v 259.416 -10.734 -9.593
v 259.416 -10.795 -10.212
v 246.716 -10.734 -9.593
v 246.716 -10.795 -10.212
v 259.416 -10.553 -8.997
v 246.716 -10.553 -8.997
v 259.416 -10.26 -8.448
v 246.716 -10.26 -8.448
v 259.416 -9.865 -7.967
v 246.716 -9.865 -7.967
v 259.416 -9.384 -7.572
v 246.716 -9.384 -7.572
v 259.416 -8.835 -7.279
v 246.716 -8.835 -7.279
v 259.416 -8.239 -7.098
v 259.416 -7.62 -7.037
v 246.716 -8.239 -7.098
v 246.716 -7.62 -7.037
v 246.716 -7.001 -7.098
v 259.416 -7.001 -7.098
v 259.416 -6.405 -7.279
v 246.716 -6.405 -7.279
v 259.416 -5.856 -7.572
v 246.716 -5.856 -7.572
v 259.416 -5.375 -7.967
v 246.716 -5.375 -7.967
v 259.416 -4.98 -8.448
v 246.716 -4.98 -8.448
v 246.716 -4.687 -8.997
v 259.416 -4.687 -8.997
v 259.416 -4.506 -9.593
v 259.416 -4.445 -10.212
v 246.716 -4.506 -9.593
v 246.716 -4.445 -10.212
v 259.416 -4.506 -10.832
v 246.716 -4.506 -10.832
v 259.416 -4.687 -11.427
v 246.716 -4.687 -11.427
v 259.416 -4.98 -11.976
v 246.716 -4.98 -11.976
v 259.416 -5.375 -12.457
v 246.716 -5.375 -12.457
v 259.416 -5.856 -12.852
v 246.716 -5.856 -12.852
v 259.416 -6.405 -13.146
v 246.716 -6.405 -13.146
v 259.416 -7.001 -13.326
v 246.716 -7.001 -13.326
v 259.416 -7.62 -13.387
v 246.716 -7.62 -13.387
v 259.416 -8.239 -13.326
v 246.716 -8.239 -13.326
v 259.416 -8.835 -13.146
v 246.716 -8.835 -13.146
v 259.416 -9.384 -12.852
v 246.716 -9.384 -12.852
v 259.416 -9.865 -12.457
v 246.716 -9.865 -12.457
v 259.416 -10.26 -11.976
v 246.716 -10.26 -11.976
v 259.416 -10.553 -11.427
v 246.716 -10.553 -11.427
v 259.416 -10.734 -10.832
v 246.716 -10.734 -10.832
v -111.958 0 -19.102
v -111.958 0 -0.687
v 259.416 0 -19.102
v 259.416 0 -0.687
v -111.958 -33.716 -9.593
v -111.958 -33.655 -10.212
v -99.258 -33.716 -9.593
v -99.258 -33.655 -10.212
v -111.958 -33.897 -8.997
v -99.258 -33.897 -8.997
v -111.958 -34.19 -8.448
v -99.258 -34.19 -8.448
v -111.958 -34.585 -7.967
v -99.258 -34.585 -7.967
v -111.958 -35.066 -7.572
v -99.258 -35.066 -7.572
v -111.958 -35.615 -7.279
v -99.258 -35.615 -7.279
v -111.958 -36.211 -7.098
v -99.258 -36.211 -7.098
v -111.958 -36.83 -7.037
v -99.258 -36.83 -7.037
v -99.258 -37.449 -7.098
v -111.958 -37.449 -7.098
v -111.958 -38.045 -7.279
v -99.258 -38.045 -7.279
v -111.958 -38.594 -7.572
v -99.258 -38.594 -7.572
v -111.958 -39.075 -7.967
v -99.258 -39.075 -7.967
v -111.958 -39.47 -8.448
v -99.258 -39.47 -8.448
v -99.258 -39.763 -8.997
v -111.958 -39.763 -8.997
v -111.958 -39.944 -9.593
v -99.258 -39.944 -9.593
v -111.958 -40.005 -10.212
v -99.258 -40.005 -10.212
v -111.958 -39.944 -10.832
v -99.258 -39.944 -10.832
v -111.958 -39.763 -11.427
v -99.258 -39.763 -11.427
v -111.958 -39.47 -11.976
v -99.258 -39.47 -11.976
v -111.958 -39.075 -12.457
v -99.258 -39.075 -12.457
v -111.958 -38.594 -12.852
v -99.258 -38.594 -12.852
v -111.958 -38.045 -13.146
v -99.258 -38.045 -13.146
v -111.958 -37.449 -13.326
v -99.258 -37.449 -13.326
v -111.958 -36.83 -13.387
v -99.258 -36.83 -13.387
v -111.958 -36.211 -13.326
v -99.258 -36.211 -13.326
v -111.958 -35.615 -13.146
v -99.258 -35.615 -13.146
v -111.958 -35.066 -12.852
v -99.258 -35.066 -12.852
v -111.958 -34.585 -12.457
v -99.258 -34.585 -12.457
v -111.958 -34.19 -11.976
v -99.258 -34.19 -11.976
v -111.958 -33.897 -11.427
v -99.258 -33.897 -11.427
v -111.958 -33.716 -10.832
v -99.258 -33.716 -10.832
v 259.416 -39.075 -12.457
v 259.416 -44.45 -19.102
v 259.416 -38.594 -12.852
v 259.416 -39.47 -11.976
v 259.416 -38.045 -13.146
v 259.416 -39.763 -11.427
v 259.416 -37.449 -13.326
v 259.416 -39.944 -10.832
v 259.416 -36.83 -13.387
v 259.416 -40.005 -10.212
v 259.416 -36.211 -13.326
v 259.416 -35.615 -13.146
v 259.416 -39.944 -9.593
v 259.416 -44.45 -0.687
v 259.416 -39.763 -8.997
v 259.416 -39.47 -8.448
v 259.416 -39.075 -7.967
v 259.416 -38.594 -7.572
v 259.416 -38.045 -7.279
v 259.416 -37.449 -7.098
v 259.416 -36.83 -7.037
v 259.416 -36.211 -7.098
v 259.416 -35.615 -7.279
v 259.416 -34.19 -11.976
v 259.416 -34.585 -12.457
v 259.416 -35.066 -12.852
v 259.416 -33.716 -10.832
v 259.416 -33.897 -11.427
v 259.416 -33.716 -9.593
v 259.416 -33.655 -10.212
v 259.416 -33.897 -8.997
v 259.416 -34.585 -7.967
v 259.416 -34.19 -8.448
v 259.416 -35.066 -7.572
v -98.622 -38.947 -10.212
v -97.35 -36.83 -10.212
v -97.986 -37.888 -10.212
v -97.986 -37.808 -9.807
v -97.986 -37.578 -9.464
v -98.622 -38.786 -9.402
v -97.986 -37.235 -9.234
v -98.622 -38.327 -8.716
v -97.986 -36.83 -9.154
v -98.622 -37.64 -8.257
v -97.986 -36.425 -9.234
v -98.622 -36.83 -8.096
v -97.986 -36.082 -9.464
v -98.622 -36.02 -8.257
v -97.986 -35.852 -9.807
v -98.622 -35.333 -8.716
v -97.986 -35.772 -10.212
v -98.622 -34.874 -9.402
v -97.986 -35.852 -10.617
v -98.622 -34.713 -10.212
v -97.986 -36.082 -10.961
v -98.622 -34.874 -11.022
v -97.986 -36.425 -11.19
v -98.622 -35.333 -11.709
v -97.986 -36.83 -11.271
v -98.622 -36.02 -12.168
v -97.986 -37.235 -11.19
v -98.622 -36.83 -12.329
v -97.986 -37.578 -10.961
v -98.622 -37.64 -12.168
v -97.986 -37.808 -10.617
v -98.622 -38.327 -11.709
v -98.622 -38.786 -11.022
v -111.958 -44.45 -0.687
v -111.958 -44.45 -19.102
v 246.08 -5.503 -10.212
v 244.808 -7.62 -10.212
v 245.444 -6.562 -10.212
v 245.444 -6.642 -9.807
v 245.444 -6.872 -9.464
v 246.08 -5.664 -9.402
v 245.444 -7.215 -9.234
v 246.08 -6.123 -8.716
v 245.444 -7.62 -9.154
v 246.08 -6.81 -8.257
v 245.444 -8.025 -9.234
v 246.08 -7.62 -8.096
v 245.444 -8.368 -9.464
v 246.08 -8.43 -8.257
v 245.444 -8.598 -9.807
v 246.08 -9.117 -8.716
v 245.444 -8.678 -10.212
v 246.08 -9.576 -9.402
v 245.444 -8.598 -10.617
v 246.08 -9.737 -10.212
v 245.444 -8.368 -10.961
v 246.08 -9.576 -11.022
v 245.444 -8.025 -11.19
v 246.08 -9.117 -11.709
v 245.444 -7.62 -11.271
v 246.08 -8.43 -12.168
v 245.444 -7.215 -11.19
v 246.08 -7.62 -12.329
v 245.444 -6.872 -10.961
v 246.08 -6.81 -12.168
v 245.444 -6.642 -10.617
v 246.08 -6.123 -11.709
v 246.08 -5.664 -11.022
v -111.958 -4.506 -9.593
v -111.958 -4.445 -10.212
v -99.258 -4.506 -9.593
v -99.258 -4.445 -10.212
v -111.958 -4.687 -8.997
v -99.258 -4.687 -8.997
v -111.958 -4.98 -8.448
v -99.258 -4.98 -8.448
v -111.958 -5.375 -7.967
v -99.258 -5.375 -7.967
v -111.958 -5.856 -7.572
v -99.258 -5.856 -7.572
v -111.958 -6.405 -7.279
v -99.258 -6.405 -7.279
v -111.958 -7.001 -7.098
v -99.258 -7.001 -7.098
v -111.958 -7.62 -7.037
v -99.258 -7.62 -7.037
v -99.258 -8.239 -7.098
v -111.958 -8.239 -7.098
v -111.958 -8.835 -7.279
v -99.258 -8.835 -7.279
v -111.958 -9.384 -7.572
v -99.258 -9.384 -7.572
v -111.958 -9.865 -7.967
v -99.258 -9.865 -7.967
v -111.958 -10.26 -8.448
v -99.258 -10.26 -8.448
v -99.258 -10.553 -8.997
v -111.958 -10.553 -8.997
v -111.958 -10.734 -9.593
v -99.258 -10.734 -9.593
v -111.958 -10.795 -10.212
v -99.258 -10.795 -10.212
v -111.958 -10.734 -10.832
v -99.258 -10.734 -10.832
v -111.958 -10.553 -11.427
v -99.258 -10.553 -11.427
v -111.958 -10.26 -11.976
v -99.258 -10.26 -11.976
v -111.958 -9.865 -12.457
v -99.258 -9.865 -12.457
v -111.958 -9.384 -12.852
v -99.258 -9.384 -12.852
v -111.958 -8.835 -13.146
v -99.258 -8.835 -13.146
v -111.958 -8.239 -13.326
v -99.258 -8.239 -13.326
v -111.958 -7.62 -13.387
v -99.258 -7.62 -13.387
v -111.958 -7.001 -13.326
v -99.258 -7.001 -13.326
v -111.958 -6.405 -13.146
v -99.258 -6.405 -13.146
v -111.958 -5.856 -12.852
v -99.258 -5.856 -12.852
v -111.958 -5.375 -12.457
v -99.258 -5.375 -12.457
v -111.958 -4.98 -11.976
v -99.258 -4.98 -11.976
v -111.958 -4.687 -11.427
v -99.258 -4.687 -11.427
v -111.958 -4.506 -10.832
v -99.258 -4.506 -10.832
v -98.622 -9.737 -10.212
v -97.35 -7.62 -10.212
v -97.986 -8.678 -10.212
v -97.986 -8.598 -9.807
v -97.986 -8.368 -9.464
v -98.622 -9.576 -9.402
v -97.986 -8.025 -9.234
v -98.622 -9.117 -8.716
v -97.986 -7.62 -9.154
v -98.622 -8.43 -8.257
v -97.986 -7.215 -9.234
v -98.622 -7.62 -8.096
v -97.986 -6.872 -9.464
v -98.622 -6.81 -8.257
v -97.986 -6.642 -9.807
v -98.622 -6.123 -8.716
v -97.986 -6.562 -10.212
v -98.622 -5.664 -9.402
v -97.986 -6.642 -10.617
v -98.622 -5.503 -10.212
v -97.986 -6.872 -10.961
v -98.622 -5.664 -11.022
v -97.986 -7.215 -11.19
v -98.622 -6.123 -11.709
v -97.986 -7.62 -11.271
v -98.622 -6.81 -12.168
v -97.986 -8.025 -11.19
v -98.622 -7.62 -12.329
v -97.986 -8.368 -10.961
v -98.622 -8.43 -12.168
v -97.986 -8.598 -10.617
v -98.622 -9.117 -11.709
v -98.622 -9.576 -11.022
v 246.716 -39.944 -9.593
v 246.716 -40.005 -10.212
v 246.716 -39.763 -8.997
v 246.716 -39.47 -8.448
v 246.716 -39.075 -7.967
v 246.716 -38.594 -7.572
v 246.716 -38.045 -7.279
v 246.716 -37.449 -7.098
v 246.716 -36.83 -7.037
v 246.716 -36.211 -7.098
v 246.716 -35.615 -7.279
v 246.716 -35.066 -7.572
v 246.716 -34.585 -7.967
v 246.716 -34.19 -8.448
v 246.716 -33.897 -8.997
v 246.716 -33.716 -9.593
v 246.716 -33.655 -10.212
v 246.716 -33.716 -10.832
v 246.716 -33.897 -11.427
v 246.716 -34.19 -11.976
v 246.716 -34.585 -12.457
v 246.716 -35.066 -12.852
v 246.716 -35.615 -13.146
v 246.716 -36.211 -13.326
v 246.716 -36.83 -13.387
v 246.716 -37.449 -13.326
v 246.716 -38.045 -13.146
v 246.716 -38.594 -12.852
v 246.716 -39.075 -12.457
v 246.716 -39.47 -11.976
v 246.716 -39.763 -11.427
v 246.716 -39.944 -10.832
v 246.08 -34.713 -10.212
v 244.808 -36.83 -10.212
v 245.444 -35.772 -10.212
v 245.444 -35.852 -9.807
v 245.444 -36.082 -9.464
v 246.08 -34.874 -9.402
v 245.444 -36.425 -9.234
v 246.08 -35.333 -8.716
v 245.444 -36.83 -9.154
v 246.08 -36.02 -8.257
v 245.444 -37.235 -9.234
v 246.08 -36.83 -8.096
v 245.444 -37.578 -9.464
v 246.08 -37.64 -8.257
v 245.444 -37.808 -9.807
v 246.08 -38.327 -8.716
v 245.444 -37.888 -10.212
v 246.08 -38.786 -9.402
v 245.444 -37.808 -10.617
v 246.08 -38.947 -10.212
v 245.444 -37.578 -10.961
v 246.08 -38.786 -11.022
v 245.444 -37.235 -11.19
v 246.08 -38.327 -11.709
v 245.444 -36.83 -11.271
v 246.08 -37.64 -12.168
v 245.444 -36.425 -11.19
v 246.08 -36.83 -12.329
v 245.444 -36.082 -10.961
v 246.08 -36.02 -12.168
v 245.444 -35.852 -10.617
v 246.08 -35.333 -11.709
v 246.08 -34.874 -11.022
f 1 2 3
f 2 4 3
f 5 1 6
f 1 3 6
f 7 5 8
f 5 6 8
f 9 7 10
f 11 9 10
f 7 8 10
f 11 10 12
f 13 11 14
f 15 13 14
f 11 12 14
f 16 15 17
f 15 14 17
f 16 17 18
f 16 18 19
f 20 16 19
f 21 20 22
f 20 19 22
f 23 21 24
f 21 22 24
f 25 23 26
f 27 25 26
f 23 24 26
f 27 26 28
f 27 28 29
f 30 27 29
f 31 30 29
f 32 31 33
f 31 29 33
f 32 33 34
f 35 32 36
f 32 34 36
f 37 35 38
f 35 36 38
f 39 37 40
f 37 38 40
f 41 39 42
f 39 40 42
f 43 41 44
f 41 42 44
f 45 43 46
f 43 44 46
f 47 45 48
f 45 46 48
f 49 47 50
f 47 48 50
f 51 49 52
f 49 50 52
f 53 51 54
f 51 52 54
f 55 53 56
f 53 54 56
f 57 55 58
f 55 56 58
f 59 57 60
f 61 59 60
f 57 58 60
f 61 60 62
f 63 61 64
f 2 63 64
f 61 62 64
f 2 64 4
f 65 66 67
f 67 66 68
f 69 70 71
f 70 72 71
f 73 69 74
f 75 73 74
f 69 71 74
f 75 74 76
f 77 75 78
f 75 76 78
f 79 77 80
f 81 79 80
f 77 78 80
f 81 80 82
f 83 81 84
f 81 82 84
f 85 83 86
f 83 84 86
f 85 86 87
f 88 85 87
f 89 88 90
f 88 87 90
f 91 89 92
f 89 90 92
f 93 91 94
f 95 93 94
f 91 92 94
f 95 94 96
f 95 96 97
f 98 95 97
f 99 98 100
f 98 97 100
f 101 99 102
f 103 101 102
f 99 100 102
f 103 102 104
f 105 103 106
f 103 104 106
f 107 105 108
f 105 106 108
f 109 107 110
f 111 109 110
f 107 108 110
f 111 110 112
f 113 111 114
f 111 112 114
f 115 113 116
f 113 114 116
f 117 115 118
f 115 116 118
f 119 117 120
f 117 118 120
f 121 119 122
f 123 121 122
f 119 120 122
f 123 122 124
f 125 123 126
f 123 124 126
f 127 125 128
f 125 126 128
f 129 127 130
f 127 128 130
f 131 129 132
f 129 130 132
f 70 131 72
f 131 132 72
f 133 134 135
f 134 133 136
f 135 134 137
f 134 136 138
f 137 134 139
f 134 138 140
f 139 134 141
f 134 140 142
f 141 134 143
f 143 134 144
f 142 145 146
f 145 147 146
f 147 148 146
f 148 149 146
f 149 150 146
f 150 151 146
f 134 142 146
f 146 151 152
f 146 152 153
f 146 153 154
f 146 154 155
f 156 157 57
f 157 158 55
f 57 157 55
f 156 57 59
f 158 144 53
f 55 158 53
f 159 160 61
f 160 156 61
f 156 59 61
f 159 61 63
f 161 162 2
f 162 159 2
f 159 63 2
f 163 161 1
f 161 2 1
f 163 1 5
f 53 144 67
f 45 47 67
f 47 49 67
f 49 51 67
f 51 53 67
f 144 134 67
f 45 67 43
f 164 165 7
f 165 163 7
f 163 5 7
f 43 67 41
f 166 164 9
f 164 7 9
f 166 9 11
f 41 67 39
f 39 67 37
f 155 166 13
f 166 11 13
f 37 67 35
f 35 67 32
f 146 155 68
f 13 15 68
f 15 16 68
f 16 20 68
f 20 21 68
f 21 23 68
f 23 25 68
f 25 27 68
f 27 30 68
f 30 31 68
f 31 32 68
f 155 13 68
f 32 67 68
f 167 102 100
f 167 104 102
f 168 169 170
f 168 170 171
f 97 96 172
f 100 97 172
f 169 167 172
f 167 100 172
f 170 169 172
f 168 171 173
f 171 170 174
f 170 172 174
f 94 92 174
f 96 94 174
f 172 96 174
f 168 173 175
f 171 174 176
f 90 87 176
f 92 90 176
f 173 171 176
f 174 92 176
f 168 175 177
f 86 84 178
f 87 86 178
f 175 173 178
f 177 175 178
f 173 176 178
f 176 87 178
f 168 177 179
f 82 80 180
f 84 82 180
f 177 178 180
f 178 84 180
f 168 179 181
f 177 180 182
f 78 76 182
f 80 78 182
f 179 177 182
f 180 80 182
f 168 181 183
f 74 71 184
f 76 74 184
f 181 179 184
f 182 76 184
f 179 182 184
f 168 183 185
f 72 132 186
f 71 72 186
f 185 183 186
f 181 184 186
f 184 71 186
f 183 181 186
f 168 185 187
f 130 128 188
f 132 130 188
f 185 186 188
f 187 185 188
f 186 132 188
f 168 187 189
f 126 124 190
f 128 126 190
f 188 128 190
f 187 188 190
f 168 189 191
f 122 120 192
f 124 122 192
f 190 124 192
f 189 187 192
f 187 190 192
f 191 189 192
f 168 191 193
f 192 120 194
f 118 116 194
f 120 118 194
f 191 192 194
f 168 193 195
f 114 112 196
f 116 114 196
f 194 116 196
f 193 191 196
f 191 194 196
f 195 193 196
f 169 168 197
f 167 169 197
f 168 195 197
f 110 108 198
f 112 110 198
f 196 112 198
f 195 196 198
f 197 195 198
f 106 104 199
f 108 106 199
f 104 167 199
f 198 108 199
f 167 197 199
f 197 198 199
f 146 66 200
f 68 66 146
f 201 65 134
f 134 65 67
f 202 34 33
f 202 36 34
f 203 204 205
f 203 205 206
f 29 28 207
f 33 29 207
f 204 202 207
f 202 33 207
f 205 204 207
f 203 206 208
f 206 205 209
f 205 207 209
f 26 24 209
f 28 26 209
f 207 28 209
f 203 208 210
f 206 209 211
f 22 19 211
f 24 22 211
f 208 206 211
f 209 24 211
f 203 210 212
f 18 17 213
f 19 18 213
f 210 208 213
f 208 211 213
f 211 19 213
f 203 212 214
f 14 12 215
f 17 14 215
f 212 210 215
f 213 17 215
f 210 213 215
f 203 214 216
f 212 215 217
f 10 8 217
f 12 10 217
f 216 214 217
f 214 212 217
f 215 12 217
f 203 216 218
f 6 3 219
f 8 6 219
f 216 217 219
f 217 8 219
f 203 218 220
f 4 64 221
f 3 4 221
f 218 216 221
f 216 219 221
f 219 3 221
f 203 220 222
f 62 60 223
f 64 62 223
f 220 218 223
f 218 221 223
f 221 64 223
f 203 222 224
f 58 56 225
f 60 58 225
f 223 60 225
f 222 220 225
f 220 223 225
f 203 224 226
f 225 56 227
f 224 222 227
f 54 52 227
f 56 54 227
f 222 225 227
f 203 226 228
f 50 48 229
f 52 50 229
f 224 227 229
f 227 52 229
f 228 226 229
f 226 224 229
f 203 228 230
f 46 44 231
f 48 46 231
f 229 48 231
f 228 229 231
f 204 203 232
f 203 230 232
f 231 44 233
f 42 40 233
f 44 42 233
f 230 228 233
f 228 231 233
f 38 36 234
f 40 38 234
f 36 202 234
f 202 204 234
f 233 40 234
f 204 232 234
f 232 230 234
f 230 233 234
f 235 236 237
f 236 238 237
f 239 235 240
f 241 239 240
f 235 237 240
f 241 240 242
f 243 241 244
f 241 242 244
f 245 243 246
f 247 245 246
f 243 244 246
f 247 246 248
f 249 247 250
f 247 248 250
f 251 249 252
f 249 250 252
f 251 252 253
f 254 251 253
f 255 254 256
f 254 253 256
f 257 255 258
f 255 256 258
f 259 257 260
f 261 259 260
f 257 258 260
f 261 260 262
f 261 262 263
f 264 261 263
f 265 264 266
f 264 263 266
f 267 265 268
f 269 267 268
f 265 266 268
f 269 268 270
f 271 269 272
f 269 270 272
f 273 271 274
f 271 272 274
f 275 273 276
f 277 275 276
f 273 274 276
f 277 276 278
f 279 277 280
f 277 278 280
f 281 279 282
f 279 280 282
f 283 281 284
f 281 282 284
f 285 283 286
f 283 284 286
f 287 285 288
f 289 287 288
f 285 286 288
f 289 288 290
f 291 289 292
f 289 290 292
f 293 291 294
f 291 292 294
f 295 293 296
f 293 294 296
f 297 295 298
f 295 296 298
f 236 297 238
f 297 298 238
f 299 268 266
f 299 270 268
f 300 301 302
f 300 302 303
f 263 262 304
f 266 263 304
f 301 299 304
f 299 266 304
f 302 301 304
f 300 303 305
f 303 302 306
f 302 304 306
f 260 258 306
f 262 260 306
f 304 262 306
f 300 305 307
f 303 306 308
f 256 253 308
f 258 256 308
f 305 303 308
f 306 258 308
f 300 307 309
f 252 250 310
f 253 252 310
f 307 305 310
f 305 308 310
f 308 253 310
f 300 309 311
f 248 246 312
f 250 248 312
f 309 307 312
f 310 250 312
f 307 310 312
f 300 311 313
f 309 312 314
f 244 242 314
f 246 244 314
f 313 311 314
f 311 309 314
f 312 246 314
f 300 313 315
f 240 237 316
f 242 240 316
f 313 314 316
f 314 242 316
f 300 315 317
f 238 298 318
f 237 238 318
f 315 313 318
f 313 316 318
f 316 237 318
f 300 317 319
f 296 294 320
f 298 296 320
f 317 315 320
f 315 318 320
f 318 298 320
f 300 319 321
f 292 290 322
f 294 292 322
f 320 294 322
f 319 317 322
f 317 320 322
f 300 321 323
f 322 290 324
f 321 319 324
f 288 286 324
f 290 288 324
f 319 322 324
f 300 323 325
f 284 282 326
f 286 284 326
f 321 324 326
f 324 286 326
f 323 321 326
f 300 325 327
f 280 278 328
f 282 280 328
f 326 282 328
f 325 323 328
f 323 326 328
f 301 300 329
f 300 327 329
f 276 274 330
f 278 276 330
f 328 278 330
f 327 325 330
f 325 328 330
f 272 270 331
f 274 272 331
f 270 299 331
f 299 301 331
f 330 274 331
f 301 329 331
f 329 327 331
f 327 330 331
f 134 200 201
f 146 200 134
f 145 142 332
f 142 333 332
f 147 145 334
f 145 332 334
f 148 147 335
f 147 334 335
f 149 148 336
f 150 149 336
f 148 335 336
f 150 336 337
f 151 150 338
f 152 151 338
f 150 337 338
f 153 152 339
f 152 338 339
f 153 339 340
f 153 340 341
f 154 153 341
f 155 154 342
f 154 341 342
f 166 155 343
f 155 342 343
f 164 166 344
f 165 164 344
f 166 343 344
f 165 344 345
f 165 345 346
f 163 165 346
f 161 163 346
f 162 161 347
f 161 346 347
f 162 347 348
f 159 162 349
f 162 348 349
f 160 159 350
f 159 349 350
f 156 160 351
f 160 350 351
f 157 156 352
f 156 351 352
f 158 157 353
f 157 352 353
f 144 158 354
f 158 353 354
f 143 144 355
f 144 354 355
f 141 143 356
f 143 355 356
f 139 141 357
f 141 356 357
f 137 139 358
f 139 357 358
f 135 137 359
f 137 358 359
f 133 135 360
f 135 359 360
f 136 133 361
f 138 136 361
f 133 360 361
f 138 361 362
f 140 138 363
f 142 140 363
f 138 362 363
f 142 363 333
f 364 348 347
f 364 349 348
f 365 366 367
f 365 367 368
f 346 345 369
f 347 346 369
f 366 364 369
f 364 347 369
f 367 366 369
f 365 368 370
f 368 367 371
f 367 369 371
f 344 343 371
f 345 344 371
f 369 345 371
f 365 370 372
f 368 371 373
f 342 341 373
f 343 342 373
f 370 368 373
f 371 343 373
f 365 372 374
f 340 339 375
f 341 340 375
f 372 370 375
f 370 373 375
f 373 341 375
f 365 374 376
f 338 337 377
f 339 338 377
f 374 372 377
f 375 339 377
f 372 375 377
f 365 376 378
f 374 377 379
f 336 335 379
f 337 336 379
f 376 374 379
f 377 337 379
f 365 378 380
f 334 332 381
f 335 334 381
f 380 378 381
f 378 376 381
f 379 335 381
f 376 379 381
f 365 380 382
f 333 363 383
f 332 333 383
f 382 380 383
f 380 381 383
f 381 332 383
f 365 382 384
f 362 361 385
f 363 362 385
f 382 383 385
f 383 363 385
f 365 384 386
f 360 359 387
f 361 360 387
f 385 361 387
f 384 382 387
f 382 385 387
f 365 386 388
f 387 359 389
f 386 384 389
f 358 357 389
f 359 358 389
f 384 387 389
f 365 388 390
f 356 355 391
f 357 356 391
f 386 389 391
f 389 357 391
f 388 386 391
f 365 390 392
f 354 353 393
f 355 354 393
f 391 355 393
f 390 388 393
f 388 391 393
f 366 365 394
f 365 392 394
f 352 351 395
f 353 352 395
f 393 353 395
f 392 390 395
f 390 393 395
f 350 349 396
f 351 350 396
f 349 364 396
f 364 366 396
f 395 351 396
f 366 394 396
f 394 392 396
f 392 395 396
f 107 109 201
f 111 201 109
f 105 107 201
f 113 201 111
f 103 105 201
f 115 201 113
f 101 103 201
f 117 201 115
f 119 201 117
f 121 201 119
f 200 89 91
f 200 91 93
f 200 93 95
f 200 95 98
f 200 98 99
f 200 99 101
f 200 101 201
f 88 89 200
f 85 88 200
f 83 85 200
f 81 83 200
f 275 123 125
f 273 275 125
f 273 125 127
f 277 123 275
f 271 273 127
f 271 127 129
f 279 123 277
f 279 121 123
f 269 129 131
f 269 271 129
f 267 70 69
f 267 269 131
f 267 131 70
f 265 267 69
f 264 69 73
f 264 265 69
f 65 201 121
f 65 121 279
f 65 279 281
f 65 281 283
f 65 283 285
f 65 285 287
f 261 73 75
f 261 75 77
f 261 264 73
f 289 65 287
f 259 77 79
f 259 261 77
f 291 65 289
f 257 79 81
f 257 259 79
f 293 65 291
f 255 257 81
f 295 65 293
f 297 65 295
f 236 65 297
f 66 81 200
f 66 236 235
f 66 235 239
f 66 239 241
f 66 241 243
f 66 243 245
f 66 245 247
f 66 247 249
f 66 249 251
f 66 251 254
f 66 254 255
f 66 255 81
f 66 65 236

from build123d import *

# Parameters (mm, degrees)
F0_W           = 371.3734
F0_H           = 18.415
F1_DEPTH       = 44.45
F5_D           = 6.35
F5_DEPTH       = 12.7
F5_TIP         = 1.9077324654
F5_ON_F3_D     = 6.35
F5_ON_F3_DEPTH = 12.7
F5_ON_F3_TIP   = 1.9077324654
F5_ON_F2_D     = 6.35
F5_ON_F2_DEPTH = 12.7
F5_ON_F2_TIP   = 1.9077324654


with BuildPart() as f1:
    # F0 (on Front) → F1 (new body)
    with BuildSketch(Plane.XZ):
        with Locations((73.7288090025, -9.8947464747)):
            Rectangle(F0_W, F0_H)
    extrude(amount=F1_DEPTH)

    # F5
    with Locations(Plane(origin=(-111.9578909975, 0, 0), x_dir=(0, -1, 0), z_dir=(-1, 0, 0))):
        with Locations((7.62, -10.2122464747), (36.83, -10.2122464747)):
            Hole(F5_D / 2, depth=F5_DEPTH)
            with Locations((0, 0, -(F5_DEPTH + F5_TIP / 2))):  # 118° drill point
                Cone(0, F5_D / 2, F5_TIP, mode=Mode.SUBTRACT)

    # F5 on F3
    with Locations(Plane.YZ.offset(259.4155090025)):
        with Locations((-36.83, -10.2122464747)):
            Hole(F5_ON_F3_D / 2, depth=F5_ON_F3_DEPTH)
            with Locations((0, 0, -(F5_ON_F3_DEPTH + F5_ON_F3_TIP / 2))):  # 118° drill point
                Cone(0, F5_ON_F3_D / 2, F5_ON_F3_TIP, mode=Mode.SUBTRACT)

    # F5 on F2
    with Locations(Plane.YZ.offset(259.4155090025)):
        with Locations((-7.62, -10.2122464747)):
            Hole(F5_ON_F2_D / 2, depth=F5_ON_F2_DEPTH)
            with Locations((0, 0, -(F5_ON_F2_DEPTH + F5_ON_F2_TIP / 2))):  # 118° drill point
                Cone(0, F5_ON_F2_D / 2, F5_ON_F2_TIP, mode=Mode.SUBTRACT)


solid = f1.part
